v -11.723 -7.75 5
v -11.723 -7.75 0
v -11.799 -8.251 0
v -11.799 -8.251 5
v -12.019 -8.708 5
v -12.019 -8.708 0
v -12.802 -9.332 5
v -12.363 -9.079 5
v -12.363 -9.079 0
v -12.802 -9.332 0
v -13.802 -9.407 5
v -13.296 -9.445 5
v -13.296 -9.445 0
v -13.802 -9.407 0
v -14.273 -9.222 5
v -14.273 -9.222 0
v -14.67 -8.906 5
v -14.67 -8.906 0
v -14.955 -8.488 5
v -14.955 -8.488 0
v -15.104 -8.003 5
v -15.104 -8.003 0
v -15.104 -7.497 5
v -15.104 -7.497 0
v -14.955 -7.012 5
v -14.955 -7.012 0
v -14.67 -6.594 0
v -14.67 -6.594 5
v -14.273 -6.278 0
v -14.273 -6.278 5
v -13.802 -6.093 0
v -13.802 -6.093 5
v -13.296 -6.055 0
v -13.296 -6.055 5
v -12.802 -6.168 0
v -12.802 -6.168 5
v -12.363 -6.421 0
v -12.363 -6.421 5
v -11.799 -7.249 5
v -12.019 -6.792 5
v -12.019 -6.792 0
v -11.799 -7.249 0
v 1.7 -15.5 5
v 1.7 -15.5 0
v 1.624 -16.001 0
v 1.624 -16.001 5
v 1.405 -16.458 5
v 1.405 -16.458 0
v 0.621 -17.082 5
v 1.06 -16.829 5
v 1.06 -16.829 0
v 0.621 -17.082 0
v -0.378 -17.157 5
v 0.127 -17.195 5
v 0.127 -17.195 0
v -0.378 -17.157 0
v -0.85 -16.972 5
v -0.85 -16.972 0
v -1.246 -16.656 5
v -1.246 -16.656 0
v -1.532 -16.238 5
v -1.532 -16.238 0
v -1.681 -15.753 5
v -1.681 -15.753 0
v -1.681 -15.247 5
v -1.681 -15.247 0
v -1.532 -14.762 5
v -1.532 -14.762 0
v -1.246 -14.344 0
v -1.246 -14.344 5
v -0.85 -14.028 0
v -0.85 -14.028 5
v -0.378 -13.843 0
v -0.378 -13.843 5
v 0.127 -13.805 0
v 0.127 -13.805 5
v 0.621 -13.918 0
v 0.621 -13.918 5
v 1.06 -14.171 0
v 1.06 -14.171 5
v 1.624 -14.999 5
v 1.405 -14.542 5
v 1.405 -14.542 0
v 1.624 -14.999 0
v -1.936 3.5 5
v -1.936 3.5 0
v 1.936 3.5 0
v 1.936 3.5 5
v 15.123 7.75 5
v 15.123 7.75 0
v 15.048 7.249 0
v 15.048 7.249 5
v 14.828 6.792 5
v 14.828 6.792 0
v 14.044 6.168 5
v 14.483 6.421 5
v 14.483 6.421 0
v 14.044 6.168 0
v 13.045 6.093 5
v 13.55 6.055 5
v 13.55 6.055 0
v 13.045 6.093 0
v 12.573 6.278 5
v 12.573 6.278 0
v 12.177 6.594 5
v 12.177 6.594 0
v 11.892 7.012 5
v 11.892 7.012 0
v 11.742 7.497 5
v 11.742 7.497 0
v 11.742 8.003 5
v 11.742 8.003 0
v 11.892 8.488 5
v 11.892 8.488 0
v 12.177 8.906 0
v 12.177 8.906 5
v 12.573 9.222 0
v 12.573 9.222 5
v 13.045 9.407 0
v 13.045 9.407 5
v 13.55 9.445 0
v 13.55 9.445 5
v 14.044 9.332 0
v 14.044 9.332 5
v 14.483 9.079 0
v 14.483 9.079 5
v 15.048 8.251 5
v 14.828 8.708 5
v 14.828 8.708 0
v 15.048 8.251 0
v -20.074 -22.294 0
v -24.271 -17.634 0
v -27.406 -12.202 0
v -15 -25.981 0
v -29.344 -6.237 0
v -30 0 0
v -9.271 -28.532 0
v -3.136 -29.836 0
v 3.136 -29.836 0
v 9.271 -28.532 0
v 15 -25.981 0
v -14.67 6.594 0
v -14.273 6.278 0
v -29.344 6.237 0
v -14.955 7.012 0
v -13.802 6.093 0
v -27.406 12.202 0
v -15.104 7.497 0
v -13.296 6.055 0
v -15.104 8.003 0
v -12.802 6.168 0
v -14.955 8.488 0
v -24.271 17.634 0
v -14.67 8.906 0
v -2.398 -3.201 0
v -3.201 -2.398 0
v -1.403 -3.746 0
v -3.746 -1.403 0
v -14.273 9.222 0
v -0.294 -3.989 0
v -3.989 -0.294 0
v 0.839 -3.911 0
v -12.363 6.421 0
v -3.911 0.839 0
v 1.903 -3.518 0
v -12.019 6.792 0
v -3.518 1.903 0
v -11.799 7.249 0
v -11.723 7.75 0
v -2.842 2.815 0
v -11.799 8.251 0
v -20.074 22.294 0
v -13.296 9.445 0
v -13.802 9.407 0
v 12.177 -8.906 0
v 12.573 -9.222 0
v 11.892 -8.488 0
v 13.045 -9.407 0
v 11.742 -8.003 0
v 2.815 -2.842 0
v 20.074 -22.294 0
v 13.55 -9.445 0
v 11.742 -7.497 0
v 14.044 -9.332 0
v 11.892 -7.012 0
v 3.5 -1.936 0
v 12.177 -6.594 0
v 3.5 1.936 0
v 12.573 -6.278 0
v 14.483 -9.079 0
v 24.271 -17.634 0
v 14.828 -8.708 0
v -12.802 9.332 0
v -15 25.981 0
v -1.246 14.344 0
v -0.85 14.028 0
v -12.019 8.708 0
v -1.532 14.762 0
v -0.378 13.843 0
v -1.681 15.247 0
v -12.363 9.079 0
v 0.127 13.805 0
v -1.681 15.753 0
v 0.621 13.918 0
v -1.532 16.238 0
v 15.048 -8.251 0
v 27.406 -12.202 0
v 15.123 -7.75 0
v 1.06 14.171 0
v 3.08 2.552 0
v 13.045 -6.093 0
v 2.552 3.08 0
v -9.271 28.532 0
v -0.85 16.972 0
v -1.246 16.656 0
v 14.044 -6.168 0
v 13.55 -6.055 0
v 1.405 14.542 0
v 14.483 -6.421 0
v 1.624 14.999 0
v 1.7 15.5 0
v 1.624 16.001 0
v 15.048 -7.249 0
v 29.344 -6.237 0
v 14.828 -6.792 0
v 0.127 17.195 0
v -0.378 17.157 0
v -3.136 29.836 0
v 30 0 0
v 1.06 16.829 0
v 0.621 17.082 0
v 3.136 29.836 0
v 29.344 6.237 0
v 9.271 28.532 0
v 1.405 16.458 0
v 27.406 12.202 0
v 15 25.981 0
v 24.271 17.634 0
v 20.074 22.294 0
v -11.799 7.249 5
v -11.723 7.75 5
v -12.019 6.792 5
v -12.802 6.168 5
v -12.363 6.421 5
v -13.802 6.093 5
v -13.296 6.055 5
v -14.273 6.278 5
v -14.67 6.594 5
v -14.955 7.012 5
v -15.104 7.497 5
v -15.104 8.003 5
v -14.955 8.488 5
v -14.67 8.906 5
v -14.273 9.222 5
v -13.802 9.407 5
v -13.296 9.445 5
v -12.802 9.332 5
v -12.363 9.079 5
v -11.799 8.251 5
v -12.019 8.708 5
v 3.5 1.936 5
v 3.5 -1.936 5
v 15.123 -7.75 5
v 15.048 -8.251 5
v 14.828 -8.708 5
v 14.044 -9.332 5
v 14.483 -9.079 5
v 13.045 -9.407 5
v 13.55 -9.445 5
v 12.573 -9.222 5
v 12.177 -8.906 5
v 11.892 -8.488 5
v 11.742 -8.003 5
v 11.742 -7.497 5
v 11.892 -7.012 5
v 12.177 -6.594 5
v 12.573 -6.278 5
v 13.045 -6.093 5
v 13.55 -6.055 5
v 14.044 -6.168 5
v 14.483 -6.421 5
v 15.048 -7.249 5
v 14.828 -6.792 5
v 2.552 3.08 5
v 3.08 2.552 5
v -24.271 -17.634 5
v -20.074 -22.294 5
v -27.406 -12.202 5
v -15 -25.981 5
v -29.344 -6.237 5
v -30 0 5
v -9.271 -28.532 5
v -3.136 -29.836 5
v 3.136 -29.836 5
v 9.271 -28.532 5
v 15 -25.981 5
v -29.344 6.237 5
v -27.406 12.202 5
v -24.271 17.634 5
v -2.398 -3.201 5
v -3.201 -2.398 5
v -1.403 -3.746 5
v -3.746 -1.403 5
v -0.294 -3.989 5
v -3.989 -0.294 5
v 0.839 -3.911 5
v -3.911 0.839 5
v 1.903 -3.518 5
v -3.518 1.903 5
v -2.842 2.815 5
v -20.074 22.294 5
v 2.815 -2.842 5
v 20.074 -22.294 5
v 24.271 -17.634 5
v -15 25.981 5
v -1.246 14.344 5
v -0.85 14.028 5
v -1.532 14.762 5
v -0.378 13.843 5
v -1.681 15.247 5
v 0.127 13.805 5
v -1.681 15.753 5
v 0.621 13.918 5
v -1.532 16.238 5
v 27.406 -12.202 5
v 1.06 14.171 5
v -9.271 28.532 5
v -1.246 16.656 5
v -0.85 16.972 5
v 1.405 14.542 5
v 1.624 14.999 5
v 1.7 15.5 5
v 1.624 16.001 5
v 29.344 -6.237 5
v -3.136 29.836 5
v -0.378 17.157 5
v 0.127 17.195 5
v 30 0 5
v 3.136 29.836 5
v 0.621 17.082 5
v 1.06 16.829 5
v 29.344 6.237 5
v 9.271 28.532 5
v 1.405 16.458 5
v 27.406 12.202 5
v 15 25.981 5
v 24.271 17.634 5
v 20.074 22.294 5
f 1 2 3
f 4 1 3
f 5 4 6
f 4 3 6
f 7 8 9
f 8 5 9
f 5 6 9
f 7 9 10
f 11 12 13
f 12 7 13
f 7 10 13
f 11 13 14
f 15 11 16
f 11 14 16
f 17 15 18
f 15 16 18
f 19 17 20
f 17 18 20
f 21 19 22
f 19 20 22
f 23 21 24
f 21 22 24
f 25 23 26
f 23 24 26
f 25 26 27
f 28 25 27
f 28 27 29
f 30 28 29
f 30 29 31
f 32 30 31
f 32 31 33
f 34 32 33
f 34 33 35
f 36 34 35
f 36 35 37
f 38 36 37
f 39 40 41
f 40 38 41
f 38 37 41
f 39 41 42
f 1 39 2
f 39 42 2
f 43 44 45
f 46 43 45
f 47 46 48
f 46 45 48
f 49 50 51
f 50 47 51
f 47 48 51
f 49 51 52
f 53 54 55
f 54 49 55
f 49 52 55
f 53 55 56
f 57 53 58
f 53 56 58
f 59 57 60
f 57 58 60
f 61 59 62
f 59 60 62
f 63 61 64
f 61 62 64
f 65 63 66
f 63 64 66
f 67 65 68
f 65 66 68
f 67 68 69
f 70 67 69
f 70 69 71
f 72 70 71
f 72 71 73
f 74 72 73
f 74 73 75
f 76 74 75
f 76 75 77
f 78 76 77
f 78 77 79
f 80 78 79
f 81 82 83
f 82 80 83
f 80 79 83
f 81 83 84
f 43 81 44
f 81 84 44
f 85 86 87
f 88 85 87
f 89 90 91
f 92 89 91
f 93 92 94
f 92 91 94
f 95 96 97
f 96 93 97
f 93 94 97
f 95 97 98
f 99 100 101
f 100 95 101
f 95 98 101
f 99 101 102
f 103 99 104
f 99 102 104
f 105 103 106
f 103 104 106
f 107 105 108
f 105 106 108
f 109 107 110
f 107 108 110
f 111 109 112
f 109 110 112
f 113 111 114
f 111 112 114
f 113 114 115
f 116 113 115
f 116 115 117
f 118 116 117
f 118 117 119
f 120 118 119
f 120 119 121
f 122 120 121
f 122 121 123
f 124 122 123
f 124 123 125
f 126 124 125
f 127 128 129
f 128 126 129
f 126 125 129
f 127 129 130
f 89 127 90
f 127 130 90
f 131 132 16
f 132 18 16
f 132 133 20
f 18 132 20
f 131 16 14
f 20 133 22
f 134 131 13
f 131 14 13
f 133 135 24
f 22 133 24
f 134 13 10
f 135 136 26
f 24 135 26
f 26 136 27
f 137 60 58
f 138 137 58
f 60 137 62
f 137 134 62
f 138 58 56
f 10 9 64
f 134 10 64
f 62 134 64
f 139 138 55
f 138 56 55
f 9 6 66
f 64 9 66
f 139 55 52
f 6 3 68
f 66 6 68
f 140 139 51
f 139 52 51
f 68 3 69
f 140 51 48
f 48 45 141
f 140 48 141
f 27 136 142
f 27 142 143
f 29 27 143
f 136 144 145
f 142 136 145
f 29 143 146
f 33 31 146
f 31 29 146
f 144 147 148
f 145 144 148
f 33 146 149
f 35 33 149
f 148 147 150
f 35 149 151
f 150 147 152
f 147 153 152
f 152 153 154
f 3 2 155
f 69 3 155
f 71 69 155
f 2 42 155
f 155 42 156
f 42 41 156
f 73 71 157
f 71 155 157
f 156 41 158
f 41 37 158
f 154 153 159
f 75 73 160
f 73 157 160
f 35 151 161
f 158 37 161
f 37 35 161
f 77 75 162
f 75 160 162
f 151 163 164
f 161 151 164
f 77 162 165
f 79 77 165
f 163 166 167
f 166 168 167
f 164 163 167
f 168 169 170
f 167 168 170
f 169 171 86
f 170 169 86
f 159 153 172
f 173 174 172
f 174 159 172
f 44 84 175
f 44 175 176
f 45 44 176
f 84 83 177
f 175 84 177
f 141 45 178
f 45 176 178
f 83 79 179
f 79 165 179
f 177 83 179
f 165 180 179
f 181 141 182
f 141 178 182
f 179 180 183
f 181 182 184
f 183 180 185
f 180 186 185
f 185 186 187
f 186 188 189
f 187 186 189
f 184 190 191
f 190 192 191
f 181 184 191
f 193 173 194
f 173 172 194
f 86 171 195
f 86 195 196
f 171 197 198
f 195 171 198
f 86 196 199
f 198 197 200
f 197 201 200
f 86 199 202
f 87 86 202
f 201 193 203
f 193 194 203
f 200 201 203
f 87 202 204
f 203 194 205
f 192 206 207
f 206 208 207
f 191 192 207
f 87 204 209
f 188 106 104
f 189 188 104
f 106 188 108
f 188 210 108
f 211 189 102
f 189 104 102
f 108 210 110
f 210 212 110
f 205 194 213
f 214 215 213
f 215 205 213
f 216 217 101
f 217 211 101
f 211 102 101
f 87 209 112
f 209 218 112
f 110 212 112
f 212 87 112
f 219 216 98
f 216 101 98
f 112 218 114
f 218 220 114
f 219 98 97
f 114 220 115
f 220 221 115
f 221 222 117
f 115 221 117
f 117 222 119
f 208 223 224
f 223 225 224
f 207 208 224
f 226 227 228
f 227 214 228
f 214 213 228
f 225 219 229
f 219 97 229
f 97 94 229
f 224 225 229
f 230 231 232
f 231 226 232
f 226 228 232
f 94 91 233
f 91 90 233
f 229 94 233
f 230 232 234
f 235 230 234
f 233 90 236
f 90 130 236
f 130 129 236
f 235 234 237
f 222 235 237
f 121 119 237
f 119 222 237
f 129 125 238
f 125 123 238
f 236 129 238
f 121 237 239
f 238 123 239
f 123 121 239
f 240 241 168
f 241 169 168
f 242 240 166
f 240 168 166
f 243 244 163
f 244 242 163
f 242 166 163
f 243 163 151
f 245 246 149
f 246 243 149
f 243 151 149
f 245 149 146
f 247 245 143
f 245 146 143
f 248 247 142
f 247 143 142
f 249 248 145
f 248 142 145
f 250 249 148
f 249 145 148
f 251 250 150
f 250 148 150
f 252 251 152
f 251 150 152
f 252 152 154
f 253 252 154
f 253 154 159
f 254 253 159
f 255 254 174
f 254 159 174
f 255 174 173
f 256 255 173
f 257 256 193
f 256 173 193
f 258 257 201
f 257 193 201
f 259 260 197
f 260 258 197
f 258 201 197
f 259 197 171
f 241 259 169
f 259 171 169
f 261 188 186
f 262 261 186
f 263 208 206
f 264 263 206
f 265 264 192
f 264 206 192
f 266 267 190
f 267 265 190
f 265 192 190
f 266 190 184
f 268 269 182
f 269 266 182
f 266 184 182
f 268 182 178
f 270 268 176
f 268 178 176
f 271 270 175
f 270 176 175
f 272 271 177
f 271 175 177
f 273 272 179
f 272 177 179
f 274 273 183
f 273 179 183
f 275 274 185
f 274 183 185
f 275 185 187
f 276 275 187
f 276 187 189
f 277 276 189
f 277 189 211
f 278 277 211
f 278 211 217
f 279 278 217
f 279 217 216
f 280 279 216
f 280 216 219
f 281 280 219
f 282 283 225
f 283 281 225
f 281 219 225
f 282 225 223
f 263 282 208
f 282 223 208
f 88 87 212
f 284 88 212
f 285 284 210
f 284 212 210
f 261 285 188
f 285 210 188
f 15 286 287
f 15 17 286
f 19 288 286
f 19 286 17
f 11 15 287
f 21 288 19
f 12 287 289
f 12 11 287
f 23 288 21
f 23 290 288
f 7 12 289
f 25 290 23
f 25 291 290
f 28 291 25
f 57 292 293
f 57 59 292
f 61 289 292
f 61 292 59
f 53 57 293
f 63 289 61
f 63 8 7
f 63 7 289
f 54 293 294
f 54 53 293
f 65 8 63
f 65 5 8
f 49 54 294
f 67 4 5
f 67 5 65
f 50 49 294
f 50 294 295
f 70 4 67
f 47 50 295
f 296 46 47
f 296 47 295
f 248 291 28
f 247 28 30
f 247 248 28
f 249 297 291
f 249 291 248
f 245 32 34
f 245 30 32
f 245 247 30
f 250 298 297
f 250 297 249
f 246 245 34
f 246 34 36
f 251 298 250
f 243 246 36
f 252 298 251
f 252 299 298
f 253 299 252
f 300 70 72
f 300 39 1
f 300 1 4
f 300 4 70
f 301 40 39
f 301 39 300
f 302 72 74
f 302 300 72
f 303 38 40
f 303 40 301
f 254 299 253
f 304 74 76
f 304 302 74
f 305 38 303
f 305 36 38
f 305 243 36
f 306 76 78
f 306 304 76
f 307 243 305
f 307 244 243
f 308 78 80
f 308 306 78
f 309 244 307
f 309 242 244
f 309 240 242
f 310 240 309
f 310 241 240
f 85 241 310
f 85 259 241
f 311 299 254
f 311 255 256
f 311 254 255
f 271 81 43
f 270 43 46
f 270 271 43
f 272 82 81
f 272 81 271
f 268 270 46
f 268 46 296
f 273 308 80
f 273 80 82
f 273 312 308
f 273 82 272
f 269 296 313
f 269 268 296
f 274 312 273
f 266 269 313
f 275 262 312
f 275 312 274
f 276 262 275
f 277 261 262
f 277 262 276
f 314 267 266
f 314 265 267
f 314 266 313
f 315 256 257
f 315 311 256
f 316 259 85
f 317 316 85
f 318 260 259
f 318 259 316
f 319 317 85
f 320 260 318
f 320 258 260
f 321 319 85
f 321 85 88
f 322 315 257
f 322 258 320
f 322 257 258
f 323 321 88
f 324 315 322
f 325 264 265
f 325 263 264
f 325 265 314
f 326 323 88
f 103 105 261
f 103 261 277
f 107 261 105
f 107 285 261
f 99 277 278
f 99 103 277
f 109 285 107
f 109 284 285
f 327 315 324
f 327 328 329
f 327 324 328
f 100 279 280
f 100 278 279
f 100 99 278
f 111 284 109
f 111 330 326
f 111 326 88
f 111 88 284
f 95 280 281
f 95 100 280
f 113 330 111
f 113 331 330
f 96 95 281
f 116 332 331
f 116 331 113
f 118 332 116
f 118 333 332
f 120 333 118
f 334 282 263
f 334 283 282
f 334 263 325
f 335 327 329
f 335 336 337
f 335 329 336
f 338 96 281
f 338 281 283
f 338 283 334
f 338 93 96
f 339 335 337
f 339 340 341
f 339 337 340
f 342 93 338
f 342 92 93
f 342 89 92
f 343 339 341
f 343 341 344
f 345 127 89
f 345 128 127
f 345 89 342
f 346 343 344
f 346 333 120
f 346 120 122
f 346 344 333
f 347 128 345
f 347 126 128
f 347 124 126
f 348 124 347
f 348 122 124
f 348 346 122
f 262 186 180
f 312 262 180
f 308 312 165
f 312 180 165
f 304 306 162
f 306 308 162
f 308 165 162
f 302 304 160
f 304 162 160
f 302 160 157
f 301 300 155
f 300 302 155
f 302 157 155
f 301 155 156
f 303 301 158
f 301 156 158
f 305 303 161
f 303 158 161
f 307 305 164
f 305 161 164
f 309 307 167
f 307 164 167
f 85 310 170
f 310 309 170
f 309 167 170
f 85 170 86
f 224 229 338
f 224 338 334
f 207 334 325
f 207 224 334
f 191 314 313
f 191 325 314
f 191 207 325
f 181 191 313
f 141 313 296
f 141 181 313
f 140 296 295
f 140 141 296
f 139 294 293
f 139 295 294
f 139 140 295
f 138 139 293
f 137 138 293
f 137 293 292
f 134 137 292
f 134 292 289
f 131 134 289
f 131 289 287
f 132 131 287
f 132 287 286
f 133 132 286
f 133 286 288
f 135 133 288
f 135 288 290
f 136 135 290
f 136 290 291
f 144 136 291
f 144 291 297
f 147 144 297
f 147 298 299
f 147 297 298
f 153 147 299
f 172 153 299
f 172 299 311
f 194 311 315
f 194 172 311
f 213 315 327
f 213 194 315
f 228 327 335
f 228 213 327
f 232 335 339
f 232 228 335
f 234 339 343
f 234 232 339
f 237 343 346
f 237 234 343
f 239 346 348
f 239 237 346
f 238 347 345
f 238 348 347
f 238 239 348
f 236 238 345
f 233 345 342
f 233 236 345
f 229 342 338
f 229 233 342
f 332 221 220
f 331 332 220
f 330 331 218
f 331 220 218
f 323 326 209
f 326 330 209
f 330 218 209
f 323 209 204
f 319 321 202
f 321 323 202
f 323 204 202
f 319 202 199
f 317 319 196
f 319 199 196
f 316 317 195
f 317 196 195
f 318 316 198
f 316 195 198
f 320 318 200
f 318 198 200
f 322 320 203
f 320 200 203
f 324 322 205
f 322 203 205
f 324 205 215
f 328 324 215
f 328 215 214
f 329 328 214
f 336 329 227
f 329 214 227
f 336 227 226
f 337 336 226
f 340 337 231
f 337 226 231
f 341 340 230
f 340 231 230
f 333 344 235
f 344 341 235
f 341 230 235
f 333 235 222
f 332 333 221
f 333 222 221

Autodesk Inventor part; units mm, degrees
ref_plane "YZ Plane" through (0, 0, 0) normal (1, 0, 0) x (0, 1, 0)
ref_plane "XZ Plane" through (0, 0, 0) normal (0, 1, 0) x (-1, 0, 0)
ref_plane "XY Plane" through (0, 0, 0) normal (0, 0, 1) x (1, 0, 0)
sketch "Base" plane through (0, 0, 0) normal (0, 0, 1) x (1, 0, 0)
  line L0 (-1.9365, 3.5) -> (1.9365, 3.5)
  arc A0 (3.5, 1.9365) -> (1.9365, 3.5) centre (0, 0) ccw
  line L1 (3.5, 1.9365) -> (3.5, -1.9365)
  arc A1 (-1.9365, 3.5) -> (3.5, -1.9365) centre (0, 0) ccw
  circle A2 centre (0, 15.5) radius 1.65 construction
  circle A3 centre (13.4234, 7.75) radius 1.65 construction
  circle A4 centre (13.4234, -7.75) radius 1.65 construction
  circle A5 centre (0, -15.5) radius 1.65 construction
  circle A6 centre (-13.4234, -7.75) radius 1.65 construction
  circle A7 centre (-13.4234, 7.75) radius 1.65 construction
  circle A8 centre (0, 0) radius 39.5
  circle A9 centre (0, 15.5) radius 1.7
  circle A10 centre (-13.4234, 7.75) radius 1.7
  circle A11 centre (-13.4234, -7.75) radius 1.7
  circle A12 centre (0, -15.5) radius 1.7
  circle A13 centre (13.4234, -7.75) radius 1.7
  circle A14 centre (13.4234, 7.75) radius 1.7
  circle A15 centre (0, 0) radius 30
  point P0 (0, 0)
  dimension "d1" = 3.4
extrude "Plate1" add sketch "Base" along normal blind 5 contours A15
equation "\"d0\" = Thickness"
equation "\"BendRadius\" = Thickness"
equation "\"BendReliefWidth\" = Thickness"
equation "\"BendReliefDepth\" = 0.5 * Thickness"
equation "\"TransitionRadius\" = BendRadius"
equation "\"JacobiRadiusSize\" = BendRadius"
equation "\"GapSize\" = Thickness"
equation "\"Thickness\" = 5"
properties part number "NeckInnerFlange"
